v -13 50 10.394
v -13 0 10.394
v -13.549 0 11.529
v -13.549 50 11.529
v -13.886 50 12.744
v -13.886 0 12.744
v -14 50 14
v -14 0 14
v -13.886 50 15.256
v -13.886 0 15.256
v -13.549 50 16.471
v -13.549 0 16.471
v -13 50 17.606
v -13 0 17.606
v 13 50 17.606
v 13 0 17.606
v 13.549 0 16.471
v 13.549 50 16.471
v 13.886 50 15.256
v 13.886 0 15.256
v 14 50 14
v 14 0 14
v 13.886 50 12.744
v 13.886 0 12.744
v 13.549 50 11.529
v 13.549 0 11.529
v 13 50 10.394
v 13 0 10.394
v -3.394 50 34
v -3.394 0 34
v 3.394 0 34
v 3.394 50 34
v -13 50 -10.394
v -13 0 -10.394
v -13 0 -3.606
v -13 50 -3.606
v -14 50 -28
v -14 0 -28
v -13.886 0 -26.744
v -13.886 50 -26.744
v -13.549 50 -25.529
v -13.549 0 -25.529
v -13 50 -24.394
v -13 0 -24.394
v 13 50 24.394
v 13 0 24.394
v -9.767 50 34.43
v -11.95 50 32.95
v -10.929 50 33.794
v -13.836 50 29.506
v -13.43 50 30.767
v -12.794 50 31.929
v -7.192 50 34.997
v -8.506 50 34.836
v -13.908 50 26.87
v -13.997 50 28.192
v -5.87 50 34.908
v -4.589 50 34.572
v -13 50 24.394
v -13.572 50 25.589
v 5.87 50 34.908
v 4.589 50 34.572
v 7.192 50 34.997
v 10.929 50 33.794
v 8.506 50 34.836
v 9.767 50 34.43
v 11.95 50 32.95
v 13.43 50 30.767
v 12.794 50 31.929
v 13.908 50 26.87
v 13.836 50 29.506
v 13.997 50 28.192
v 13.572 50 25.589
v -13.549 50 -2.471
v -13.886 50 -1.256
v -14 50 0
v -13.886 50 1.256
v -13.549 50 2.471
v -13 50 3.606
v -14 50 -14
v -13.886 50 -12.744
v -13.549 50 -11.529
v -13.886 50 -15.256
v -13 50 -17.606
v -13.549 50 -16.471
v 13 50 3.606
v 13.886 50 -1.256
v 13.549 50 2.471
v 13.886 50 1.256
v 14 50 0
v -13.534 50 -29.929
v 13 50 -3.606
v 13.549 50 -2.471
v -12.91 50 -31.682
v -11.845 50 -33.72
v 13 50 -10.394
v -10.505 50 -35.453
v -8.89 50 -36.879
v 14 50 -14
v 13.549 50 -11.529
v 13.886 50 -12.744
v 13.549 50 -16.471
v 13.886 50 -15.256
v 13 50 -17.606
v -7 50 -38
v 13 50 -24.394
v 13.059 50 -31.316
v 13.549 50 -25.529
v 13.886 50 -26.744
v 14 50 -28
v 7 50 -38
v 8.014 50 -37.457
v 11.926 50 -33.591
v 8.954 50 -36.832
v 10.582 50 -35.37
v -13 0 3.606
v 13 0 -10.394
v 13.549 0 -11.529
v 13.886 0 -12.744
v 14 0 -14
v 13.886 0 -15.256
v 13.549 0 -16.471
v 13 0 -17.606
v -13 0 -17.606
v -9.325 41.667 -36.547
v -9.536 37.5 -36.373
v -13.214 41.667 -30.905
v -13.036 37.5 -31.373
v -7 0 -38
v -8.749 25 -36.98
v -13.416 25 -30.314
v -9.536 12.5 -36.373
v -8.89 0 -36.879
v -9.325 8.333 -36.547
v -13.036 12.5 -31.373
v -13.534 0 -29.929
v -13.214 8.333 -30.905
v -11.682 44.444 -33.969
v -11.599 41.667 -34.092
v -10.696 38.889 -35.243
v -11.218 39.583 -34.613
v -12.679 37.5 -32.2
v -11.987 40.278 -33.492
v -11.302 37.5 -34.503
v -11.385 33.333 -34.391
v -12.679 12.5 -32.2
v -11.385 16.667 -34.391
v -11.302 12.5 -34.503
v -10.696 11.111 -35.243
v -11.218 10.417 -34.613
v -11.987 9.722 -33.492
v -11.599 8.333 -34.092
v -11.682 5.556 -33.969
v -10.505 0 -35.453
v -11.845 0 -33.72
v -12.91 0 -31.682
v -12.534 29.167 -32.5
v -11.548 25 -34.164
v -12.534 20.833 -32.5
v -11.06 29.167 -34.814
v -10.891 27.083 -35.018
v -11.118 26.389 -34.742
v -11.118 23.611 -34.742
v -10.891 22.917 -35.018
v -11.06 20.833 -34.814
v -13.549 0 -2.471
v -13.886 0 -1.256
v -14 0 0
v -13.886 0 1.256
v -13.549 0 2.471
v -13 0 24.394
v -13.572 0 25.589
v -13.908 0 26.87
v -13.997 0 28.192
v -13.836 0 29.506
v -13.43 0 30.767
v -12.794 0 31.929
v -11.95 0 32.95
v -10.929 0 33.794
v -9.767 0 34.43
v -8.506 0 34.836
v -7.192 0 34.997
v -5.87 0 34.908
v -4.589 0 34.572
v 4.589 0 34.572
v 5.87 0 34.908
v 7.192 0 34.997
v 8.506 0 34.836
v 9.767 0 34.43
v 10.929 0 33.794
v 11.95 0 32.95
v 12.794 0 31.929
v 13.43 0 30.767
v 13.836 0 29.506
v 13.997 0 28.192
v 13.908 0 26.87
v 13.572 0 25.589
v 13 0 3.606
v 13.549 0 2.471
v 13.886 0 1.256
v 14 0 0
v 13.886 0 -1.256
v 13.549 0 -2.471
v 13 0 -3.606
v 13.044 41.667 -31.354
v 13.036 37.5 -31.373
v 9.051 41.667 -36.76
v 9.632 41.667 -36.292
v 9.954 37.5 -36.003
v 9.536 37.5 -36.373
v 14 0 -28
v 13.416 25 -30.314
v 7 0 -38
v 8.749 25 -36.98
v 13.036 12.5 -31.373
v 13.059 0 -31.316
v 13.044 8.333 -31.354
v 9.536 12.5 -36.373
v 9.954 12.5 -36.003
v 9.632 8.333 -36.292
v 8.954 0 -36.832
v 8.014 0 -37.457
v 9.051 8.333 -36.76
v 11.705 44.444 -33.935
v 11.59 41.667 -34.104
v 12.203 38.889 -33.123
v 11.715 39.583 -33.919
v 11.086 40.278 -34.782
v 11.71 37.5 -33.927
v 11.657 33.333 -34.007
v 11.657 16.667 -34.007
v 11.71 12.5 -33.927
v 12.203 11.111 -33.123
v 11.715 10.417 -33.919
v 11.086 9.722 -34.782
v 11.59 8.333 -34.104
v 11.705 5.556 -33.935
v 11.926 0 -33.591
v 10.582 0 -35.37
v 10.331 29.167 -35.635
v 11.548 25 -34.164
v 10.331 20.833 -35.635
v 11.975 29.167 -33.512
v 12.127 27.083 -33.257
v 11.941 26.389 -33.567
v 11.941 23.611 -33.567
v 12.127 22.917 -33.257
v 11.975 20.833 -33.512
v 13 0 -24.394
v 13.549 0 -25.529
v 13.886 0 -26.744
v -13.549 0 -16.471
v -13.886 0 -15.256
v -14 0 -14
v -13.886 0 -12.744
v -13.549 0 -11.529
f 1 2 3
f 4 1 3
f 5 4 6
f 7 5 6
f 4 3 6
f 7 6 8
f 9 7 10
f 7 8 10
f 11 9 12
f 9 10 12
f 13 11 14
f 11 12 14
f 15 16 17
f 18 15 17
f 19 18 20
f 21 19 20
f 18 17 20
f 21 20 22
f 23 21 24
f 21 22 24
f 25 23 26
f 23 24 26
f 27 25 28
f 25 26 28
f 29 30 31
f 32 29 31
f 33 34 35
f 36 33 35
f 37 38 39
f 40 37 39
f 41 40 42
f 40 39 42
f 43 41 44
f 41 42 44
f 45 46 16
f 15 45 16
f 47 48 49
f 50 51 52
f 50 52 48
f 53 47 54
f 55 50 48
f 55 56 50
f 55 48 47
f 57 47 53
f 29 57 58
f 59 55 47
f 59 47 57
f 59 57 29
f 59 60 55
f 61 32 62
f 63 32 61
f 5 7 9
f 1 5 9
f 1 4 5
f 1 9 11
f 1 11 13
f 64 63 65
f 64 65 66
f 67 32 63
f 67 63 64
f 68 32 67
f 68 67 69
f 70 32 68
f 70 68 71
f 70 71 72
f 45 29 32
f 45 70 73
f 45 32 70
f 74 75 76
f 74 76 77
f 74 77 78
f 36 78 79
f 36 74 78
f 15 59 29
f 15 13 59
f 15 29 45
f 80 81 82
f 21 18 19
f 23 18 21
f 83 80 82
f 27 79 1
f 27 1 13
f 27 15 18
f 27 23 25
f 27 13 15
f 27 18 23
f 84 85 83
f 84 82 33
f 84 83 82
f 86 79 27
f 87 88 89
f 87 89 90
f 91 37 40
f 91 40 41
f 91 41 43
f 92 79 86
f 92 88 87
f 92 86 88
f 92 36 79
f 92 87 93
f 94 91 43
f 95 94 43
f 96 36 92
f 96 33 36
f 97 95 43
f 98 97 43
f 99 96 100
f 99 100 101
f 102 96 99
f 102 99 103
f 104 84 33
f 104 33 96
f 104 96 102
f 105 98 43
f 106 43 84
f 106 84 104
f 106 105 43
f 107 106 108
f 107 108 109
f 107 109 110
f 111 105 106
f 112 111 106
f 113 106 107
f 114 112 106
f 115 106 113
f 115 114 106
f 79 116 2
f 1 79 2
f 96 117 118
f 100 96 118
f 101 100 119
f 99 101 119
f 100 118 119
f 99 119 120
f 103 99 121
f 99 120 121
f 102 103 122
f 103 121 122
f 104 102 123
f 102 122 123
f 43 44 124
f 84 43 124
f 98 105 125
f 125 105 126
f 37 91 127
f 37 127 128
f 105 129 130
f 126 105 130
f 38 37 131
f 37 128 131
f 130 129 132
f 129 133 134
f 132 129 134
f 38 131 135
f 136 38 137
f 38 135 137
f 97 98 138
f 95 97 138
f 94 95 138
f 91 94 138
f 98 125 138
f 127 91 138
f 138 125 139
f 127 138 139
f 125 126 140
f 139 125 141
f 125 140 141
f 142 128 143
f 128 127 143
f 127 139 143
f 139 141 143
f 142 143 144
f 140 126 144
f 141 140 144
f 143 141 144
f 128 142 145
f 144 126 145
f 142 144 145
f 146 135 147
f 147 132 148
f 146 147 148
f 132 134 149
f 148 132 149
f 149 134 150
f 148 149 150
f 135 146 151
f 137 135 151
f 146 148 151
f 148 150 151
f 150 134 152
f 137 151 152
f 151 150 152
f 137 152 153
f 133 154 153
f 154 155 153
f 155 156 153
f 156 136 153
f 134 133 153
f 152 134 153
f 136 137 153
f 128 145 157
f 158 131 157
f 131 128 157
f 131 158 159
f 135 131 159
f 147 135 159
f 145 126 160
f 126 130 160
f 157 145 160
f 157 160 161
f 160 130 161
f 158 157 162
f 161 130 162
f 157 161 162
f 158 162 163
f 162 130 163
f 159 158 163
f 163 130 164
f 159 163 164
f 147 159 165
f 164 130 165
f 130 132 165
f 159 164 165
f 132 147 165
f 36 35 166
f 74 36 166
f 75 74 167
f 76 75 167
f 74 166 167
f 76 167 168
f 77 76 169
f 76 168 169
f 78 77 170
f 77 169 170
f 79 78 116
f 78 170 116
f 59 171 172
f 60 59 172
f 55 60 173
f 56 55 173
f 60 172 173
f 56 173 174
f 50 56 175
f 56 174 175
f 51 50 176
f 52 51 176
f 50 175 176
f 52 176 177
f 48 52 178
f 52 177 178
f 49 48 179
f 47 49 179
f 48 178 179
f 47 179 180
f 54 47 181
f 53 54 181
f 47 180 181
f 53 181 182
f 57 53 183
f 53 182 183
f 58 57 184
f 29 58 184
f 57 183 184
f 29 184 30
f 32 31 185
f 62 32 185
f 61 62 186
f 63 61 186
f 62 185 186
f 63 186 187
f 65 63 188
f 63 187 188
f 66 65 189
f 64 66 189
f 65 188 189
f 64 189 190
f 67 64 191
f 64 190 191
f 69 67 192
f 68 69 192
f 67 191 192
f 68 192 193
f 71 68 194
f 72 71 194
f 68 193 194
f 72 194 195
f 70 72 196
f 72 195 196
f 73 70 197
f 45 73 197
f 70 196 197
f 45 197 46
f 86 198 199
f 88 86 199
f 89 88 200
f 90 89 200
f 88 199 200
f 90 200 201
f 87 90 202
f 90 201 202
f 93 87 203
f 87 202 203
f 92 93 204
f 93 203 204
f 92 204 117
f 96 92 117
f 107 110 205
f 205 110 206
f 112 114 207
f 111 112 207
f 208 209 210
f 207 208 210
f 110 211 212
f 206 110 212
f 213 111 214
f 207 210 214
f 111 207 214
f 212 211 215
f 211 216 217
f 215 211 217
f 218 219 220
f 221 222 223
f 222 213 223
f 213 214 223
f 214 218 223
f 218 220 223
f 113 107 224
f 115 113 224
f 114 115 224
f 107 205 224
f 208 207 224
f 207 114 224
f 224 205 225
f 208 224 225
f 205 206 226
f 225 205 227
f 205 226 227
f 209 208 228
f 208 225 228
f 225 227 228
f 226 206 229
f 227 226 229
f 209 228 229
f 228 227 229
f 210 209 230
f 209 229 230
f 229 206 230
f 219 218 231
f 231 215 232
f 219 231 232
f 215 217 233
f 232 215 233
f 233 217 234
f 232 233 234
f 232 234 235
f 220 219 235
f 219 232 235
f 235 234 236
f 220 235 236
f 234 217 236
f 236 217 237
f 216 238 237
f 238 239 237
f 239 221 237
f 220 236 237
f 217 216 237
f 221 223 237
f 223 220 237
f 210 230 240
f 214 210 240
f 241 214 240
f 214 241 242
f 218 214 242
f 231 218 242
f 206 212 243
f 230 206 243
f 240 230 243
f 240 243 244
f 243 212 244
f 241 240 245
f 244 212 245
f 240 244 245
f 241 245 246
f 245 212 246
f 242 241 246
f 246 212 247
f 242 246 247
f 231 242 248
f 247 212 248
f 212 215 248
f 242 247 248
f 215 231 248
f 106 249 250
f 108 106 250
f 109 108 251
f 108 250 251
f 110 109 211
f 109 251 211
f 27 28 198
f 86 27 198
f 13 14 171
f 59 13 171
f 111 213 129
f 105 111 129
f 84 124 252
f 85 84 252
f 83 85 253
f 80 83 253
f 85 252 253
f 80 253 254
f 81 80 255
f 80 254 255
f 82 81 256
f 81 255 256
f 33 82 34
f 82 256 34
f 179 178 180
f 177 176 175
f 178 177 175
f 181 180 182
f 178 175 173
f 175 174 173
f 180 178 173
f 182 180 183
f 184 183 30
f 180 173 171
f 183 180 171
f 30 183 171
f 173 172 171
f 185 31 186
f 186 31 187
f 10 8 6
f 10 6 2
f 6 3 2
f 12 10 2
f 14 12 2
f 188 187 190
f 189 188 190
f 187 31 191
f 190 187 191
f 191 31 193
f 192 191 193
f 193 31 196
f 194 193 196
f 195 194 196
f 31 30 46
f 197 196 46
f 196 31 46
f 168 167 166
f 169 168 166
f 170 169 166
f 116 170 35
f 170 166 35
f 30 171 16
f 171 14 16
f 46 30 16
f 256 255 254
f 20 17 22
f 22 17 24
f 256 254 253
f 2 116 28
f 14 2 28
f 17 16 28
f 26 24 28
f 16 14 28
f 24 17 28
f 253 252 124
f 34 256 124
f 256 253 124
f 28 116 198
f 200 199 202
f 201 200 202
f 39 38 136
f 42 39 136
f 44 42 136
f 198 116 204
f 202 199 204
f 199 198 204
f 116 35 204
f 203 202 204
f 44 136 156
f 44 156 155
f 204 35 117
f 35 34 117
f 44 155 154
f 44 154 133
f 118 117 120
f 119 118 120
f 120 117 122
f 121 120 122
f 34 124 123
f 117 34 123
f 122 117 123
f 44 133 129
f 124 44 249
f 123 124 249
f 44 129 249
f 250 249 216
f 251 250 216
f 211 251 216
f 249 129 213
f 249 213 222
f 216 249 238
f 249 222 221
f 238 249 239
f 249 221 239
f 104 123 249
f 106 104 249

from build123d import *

# Parameters (mm, degrees)
BOSS_EXTRUDE1_DEPTH = 50


with BuildPart() as part:
    # Sketch2 → Boss-Extrude1 (new body)
    with BuildSketch(Plane(origin=(0, 0, 0), x_dir=(1, 0, 0), z_dir=(0, 1, 0))):
        with BuildLine():
            Line((7, 38), (-7, 38))
            add(Edge.make_bspline(
                [(-7, 38), (-12.596418812, 35.328912619), (-14, 28)],
                knots=[0.092966826, 0.092966826, 0.092966826, 0.41073738, 0.41073738, 0.41073738], degree=2))
            ThreePointArc((-14, 28), (-13.745368782, 26.129171307), (-13, 24.394448725))
            Line((-13, 24.394448725), (-13, 17.605551275))
            ThreePointArc((-13, 17.605551275), (-14, 14), (-13, 10.394448725))
            Line((-13, 10.394448725), (-13, 3.605551275))
            ThreePointArc((-13, 3.605551275), (-14, 0), (-13, -3.605551275))
            Line((-13, -3.605551275), (-13, -10.394448725))
            ThreePointArc((-13, -10.394448725), (-14, -14), (-13, -17.605551275))
            Line((-13, -17.605551275), (-13, -24.394448725))
            ThreePointArc((-13, -24.394448725), (-11.949747468, -32.949747468), (-3.394448725, -34))
            Line((-3.394448725, -34), (3.394448725, -34))
            ThreePointArc((3.394448725, -34), (11.949747468, -32.949747468), (13, -24.394448725))
            Line((13, -24.394448725), (13, -17.605551275))
            ThreePointArc((13, -17.605551275), (14, -14), (13, -10.394448725))
            Line((13, -10.394448725), (13, -3.605551275))
            ThreePointArc((13, -3.605551275), (14, 0), (13, 3.605551275))
            Line((13, 3.605551275), (13, 10.394448725))
            ThreePointArc((13, 10.394448725), (14, 14), (13, 17.605551275))
            Line((13, 17.605551275), (13, 24.394448725))
            ThreePointArc((13, 24.394448725), (13.745368782, 26.129171307), (14, 28))
            add(Edge.make_bspline(
                [(14, 28), (12.596418812, 35.328912619), (7, 38)],
                knots=[0.907033174, 0.907033174, 0.907033174, 1.224803727, 1.224803727, 1.224803727], degree=2))
        make_face()
    extrude(amount=BOSS_EXTRUDE1_DEPTH)


solid = part.part
